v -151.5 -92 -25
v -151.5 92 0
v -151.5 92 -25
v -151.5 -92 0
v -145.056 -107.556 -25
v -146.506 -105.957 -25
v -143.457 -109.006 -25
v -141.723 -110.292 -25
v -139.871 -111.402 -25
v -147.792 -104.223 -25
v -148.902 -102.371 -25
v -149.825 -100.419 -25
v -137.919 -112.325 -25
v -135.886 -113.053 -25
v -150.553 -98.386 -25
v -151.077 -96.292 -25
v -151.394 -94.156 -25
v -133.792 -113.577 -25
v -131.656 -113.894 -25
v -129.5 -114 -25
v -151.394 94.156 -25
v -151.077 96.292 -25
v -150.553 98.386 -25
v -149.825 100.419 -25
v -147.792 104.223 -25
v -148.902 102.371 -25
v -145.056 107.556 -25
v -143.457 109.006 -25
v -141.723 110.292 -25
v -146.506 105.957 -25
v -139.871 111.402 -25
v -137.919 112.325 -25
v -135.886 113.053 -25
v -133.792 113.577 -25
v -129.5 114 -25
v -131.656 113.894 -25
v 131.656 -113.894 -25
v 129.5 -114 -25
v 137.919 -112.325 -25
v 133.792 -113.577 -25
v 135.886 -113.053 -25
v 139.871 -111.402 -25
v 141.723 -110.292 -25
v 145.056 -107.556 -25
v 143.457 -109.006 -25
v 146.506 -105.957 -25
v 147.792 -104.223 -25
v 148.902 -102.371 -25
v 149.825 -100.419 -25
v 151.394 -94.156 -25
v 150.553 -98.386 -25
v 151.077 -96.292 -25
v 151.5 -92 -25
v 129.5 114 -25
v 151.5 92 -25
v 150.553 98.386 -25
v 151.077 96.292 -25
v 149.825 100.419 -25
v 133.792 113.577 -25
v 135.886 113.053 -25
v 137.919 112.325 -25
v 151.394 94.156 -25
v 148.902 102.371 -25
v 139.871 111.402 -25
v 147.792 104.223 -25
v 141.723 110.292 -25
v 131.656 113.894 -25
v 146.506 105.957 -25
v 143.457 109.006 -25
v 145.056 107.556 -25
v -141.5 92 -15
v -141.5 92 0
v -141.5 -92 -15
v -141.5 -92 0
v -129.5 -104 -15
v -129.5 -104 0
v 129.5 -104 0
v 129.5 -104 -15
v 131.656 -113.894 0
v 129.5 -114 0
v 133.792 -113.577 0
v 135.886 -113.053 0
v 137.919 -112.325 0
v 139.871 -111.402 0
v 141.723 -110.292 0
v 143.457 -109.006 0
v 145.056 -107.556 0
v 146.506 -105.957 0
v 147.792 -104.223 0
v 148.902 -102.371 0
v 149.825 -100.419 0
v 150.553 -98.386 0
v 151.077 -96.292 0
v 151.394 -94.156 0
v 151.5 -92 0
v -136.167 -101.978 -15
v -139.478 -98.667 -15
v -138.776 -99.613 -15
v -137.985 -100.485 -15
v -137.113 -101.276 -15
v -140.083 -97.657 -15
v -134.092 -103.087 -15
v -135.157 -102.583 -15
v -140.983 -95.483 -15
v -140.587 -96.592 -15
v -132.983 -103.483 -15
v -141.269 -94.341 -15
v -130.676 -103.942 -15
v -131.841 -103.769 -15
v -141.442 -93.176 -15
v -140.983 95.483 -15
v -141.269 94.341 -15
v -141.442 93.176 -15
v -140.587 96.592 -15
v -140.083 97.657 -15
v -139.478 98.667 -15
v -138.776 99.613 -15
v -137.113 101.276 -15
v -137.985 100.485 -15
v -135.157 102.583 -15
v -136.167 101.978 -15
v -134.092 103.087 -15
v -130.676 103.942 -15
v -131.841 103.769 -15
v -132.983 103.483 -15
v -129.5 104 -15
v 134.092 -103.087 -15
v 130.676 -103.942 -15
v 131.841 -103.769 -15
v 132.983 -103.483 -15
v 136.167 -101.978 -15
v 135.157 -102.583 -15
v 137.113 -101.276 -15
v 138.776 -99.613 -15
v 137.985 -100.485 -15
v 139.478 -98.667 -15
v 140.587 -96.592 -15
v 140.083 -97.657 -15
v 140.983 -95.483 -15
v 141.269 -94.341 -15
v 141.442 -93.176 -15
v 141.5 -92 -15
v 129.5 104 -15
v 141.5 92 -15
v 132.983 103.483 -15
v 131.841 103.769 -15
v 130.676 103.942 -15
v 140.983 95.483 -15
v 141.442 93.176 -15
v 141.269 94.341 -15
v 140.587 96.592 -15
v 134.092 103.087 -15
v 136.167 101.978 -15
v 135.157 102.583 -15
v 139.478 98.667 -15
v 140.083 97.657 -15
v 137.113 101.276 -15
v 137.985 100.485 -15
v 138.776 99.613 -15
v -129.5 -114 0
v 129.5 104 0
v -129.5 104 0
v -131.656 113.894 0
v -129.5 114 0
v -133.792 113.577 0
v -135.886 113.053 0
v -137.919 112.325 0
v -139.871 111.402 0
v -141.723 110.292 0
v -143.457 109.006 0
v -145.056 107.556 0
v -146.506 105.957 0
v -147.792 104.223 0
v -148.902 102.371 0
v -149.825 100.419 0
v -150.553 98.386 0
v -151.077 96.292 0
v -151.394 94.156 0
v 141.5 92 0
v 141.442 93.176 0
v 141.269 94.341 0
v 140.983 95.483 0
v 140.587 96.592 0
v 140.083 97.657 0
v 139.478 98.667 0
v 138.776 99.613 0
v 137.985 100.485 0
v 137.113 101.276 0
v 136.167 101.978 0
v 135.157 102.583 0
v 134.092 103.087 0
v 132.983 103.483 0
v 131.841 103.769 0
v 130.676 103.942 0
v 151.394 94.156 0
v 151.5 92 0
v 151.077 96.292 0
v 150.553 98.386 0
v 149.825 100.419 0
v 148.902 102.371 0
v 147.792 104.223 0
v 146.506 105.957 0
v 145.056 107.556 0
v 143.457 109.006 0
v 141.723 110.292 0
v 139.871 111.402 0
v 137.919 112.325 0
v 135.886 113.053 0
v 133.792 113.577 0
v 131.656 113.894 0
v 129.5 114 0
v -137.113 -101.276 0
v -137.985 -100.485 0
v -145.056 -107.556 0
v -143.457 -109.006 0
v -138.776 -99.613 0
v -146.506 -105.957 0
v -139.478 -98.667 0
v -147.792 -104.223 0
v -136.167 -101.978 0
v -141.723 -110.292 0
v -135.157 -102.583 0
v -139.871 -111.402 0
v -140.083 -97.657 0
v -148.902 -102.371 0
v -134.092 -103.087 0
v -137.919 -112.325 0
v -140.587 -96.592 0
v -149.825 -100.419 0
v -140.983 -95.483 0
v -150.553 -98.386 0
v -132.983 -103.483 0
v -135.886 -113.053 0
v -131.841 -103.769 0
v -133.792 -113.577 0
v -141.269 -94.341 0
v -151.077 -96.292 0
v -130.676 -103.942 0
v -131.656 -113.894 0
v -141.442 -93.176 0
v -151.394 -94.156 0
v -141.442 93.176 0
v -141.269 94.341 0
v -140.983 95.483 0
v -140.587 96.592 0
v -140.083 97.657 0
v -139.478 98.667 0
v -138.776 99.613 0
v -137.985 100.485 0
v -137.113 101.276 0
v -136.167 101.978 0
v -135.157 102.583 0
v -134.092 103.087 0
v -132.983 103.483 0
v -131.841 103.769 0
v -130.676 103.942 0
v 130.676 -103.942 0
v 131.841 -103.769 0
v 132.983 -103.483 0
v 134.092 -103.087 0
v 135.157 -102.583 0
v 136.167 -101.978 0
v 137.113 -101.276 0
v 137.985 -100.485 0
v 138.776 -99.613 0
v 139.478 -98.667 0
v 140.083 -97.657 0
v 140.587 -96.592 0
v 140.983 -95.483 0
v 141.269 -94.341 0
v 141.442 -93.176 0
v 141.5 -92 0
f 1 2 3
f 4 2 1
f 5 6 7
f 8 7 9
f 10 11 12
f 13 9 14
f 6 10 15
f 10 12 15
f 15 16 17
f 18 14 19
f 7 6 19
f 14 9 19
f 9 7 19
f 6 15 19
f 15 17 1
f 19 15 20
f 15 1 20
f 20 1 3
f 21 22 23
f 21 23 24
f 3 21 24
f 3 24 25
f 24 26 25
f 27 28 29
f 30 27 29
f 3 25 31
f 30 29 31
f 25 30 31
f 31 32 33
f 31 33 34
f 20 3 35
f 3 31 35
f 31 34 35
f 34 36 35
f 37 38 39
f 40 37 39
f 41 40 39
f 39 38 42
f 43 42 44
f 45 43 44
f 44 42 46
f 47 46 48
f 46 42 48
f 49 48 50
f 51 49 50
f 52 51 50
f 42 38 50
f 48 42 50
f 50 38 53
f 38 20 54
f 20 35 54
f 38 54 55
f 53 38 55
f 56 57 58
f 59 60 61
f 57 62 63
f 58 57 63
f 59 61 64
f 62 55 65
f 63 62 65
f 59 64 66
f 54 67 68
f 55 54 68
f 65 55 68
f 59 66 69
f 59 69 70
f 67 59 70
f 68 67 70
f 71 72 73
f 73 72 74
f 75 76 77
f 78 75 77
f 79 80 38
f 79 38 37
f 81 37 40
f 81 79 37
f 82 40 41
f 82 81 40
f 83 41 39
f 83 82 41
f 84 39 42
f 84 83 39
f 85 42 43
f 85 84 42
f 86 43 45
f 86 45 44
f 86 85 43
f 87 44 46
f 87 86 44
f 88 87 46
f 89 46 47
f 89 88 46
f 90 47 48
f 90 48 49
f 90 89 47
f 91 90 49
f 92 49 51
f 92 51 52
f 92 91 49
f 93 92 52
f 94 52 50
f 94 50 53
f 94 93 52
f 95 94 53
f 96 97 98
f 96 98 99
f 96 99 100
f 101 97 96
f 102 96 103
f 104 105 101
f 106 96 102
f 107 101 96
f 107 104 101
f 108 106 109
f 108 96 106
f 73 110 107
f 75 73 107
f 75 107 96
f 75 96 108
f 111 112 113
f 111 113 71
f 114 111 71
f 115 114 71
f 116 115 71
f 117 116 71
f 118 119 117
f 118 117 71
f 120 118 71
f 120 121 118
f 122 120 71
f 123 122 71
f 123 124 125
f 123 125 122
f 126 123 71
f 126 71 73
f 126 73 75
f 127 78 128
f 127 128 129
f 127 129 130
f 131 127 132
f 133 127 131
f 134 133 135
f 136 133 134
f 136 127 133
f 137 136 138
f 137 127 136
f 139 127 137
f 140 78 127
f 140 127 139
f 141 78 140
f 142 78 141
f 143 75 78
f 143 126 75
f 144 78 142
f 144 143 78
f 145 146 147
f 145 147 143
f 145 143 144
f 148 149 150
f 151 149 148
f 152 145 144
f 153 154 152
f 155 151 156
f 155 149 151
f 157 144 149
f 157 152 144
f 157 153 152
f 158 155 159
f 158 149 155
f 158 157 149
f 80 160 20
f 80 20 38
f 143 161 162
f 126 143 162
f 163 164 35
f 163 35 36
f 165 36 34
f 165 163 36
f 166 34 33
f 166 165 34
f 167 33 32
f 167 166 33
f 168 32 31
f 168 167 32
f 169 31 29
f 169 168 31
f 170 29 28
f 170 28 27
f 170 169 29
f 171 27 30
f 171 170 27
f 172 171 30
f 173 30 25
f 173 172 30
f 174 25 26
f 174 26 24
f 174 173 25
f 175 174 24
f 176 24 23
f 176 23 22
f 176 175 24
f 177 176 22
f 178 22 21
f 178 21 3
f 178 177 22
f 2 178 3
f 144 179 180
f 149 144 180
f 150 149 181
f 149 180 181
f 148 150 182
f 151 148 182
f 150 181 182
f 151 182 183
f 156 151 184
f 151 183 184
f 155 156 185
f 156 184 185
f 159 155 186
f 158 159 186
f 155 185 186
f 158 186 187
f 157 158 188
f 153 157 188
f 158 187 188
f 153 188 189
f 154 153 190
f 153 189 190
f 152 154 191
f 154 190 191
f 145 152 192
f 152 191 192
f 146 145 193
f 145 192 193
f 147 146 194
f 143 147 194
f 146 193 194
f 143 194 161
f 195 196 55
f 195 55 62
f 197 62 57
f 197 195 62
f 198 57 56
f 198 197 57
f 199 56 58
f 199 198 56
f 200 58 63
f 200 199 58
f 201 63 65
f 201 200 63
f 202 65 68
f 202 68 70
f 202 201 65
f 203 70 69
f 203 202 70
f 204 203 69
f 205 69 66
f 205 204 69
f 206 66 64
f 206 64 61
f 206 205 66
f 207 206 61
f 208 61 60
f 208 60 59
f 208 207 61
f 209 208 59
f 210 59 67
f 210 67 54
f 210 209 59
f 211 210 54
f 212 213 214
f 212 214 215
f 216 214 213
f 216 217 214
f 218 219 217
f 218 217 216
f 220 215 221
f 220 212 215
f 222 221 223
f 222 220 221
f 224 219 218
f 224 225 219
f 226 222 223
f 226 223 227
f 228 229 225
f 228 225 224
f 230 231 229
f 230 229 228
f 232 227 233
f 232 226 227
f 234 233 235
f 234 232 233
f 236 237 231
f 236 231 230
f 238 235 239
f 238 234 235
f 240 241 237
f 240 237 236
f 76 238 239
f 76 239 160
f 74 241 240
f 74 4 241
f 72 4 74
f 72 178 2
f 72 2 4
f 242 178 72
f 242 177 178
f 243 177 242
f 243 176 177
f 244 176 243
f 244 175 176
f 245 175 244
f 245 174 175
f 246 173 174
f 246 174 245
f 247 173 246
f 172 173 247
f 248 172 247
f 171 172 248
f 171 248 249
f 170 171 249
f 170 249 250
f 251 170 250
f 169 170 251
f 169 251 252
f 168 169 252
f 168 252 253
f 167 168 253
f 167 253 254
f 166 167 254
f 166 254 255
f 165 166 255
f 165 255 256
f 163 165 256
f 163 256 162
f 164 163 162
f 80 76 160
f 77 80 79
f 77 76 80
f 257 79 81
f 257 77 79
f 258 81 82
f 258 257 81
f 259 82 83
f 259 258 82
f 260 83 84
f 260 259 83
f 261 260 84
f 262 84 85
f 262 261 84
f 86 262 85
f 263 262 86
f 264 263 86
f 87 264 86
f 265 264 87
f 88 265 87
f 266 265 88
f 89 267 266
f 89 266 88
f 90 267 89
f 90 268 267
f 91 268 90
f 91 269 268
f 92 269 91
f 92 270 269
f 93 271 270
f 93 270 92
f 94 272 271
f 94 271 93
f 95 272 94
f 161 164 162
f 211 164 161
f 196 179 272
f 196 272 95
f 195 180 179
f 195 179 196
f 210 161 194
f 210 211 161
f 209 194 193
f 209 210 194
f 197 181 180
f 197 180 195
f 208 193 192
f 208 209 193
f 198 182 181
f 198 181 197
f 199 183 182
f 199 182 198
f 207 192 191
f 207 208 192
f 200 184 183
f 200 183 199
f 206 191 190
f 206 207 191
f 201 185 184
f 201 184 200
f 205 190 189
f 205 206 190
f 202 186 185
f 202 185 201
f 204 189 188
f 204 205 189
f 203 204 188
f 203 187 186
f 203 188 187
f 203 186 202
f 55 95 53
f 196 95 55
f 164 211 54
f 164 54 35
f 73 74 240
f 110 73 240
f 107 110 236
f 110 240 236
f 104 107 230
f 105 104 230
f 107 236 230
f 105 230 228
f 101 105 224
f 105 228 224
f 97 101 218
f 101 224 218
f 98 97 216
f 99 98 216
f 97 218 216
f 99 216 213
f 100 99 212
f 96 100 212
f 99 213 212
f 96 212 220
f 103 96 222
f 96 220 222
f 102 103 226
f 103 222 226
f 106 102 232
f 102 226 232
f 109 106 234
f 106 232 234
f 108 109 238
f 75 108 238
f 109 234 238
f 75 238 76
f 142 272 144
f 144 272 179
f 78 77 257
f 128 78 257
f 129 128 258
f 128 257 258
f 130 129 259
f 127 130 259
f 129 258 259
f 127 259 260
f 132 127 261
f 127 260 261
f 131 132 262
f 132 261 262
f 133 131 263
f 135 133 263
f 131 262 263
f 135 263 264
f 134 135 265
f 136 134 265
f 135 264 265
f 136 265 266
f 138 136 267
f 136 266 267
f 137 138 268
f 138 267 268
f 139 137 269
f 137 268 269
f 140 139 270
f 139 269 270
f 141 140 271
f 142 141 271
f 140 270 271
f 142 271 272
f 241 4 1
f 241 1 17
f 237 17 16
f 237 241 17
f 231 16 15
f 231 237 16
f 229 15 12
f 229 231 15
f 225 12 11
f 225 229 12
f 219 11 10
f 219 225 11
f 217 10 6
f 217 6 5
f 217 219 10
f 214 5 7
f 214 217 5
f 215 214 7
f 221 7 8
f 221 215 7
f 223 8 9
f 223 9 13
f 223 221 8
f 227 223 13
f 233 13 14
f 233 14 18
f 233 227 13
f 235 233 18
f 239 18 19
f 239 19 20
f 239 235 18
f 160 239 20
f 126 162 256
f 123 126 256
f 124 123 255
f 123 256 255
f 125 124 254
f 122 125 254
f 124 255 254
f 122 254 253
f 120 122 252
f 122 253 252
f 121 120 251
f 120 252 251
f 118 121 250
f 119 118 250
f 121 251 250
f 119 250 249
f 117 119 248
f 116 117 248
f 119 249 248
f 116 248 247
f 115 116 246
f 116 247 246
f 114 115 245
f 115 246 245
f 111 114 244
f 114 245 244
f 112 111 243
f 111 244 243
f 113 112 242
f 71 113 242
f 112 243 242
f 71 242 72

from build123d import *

# Parameters (mm, degrees)
F1_DEPTH = 25
F2_DEPTH = 15


with BuildPart() as f1:
    # F0 (on Top) → F1 (new body)
    with BuildSketch(Plane.XY):
        with BuildLine():
            Line((-129.5, -114), (129.5, -114))
            ThreePointArc((129.5, -114), (145.0563491861, -107.5563491861), (151.5, -92))
            Line((151.5, -92), (151.5, 92))
            ThreePointArc((151.5, 92), (145.0563491861, 107.5563491861), (129.5, 114))
            Line((129.5, 114), (-129.5, 114))
            ThreePointArc((-129.5, 114), (-145.0563491861, 107.5563491861), (-151.5, 92))
            Line((-151.5, 92), (-151.5, -92))
            ThreePointArc((-151.5, -92), (-145.0563491861, -107.5563491861), (-129.5, -114))
        make_face()
        with BuildLine():
            ThreePointArc((141.5, -92), (137.9852813742, -100.4852813742), (129.5, -104))
            Line((129.5, -104), (-129.5, -104))
            ThreePointArc((-129.5, -104), (-137.9852813742, -100.4852813742), (-141.5, -92))
            Line((-141.5, -92), (-141.5, 92))
            ThreePointArc((-141.5, 92), (-137.9852813742, 100.4852813742), (-129.5, 104))
            Line((-129.5, 104), (129.5, 104))
            ThreePointArc((129.5, 104), (137.9852813742, 100.4852813742), (141.5, 92))
            Line((141.5, 92), (141.5, -92))
        make_face(mode=Mode.SUBTRACT)
        with BuildLine():
            Line((-129.5, -104), (129.5, -104))
            ThreePointArc((129.5, -104), (137.9852813742, -100.4852813742), (141.5, -92))
            Line((141.5, -92), (141.5, 92))
            ThreePointArc((141.5, 92), (137.9852813742, 100.4852813742), (129.5, 104))
            Line((129.5, 104), (-129.5, 104))
            ThreePointArc((-129.5, 104), (-137.9852813742, 100.4852813742), (-141.5, 92))
            Line((-141.5, 92), (-141.5, -92))
            ThreePointArc((-141.5, -92), (-137.9852813742, -100.4852813742), (-129.5, -104))
        make_face()
    extrude(amount=-F1_DEPTH)

    # F0 (on Top) → F2 (cut)
    with BuildSketch(Plane.XY):
        with BuildLine():
            Line((-129.5, -104), (129.5, -104))
            ThreePointArc((129.5, -104), (137.9852813742, -100.4852813742), (141.5, -92))
            Line((141.5, -92), (141.5, 92))
            ThreePointArc((141.5, 92), (137.9852813742, 100.4852813742), (129.5, 104))
            Line((129.5, 104), (-129.5, 104))
            ThreePointArc((-129.5, 104), (-137.9852813742, 100.4852813742), (-141.5, 92))
            Line((-141.5, 92), (-141.5, -92))
            ThreePointArc((-141.5, -92), (-137.9852813742, -100.4852813742), (-129.5, -104))
        make_face()
    extrude(amount=-F2_DEPTH, mode=Mode.SUBTRACT)


solid = f1.part
